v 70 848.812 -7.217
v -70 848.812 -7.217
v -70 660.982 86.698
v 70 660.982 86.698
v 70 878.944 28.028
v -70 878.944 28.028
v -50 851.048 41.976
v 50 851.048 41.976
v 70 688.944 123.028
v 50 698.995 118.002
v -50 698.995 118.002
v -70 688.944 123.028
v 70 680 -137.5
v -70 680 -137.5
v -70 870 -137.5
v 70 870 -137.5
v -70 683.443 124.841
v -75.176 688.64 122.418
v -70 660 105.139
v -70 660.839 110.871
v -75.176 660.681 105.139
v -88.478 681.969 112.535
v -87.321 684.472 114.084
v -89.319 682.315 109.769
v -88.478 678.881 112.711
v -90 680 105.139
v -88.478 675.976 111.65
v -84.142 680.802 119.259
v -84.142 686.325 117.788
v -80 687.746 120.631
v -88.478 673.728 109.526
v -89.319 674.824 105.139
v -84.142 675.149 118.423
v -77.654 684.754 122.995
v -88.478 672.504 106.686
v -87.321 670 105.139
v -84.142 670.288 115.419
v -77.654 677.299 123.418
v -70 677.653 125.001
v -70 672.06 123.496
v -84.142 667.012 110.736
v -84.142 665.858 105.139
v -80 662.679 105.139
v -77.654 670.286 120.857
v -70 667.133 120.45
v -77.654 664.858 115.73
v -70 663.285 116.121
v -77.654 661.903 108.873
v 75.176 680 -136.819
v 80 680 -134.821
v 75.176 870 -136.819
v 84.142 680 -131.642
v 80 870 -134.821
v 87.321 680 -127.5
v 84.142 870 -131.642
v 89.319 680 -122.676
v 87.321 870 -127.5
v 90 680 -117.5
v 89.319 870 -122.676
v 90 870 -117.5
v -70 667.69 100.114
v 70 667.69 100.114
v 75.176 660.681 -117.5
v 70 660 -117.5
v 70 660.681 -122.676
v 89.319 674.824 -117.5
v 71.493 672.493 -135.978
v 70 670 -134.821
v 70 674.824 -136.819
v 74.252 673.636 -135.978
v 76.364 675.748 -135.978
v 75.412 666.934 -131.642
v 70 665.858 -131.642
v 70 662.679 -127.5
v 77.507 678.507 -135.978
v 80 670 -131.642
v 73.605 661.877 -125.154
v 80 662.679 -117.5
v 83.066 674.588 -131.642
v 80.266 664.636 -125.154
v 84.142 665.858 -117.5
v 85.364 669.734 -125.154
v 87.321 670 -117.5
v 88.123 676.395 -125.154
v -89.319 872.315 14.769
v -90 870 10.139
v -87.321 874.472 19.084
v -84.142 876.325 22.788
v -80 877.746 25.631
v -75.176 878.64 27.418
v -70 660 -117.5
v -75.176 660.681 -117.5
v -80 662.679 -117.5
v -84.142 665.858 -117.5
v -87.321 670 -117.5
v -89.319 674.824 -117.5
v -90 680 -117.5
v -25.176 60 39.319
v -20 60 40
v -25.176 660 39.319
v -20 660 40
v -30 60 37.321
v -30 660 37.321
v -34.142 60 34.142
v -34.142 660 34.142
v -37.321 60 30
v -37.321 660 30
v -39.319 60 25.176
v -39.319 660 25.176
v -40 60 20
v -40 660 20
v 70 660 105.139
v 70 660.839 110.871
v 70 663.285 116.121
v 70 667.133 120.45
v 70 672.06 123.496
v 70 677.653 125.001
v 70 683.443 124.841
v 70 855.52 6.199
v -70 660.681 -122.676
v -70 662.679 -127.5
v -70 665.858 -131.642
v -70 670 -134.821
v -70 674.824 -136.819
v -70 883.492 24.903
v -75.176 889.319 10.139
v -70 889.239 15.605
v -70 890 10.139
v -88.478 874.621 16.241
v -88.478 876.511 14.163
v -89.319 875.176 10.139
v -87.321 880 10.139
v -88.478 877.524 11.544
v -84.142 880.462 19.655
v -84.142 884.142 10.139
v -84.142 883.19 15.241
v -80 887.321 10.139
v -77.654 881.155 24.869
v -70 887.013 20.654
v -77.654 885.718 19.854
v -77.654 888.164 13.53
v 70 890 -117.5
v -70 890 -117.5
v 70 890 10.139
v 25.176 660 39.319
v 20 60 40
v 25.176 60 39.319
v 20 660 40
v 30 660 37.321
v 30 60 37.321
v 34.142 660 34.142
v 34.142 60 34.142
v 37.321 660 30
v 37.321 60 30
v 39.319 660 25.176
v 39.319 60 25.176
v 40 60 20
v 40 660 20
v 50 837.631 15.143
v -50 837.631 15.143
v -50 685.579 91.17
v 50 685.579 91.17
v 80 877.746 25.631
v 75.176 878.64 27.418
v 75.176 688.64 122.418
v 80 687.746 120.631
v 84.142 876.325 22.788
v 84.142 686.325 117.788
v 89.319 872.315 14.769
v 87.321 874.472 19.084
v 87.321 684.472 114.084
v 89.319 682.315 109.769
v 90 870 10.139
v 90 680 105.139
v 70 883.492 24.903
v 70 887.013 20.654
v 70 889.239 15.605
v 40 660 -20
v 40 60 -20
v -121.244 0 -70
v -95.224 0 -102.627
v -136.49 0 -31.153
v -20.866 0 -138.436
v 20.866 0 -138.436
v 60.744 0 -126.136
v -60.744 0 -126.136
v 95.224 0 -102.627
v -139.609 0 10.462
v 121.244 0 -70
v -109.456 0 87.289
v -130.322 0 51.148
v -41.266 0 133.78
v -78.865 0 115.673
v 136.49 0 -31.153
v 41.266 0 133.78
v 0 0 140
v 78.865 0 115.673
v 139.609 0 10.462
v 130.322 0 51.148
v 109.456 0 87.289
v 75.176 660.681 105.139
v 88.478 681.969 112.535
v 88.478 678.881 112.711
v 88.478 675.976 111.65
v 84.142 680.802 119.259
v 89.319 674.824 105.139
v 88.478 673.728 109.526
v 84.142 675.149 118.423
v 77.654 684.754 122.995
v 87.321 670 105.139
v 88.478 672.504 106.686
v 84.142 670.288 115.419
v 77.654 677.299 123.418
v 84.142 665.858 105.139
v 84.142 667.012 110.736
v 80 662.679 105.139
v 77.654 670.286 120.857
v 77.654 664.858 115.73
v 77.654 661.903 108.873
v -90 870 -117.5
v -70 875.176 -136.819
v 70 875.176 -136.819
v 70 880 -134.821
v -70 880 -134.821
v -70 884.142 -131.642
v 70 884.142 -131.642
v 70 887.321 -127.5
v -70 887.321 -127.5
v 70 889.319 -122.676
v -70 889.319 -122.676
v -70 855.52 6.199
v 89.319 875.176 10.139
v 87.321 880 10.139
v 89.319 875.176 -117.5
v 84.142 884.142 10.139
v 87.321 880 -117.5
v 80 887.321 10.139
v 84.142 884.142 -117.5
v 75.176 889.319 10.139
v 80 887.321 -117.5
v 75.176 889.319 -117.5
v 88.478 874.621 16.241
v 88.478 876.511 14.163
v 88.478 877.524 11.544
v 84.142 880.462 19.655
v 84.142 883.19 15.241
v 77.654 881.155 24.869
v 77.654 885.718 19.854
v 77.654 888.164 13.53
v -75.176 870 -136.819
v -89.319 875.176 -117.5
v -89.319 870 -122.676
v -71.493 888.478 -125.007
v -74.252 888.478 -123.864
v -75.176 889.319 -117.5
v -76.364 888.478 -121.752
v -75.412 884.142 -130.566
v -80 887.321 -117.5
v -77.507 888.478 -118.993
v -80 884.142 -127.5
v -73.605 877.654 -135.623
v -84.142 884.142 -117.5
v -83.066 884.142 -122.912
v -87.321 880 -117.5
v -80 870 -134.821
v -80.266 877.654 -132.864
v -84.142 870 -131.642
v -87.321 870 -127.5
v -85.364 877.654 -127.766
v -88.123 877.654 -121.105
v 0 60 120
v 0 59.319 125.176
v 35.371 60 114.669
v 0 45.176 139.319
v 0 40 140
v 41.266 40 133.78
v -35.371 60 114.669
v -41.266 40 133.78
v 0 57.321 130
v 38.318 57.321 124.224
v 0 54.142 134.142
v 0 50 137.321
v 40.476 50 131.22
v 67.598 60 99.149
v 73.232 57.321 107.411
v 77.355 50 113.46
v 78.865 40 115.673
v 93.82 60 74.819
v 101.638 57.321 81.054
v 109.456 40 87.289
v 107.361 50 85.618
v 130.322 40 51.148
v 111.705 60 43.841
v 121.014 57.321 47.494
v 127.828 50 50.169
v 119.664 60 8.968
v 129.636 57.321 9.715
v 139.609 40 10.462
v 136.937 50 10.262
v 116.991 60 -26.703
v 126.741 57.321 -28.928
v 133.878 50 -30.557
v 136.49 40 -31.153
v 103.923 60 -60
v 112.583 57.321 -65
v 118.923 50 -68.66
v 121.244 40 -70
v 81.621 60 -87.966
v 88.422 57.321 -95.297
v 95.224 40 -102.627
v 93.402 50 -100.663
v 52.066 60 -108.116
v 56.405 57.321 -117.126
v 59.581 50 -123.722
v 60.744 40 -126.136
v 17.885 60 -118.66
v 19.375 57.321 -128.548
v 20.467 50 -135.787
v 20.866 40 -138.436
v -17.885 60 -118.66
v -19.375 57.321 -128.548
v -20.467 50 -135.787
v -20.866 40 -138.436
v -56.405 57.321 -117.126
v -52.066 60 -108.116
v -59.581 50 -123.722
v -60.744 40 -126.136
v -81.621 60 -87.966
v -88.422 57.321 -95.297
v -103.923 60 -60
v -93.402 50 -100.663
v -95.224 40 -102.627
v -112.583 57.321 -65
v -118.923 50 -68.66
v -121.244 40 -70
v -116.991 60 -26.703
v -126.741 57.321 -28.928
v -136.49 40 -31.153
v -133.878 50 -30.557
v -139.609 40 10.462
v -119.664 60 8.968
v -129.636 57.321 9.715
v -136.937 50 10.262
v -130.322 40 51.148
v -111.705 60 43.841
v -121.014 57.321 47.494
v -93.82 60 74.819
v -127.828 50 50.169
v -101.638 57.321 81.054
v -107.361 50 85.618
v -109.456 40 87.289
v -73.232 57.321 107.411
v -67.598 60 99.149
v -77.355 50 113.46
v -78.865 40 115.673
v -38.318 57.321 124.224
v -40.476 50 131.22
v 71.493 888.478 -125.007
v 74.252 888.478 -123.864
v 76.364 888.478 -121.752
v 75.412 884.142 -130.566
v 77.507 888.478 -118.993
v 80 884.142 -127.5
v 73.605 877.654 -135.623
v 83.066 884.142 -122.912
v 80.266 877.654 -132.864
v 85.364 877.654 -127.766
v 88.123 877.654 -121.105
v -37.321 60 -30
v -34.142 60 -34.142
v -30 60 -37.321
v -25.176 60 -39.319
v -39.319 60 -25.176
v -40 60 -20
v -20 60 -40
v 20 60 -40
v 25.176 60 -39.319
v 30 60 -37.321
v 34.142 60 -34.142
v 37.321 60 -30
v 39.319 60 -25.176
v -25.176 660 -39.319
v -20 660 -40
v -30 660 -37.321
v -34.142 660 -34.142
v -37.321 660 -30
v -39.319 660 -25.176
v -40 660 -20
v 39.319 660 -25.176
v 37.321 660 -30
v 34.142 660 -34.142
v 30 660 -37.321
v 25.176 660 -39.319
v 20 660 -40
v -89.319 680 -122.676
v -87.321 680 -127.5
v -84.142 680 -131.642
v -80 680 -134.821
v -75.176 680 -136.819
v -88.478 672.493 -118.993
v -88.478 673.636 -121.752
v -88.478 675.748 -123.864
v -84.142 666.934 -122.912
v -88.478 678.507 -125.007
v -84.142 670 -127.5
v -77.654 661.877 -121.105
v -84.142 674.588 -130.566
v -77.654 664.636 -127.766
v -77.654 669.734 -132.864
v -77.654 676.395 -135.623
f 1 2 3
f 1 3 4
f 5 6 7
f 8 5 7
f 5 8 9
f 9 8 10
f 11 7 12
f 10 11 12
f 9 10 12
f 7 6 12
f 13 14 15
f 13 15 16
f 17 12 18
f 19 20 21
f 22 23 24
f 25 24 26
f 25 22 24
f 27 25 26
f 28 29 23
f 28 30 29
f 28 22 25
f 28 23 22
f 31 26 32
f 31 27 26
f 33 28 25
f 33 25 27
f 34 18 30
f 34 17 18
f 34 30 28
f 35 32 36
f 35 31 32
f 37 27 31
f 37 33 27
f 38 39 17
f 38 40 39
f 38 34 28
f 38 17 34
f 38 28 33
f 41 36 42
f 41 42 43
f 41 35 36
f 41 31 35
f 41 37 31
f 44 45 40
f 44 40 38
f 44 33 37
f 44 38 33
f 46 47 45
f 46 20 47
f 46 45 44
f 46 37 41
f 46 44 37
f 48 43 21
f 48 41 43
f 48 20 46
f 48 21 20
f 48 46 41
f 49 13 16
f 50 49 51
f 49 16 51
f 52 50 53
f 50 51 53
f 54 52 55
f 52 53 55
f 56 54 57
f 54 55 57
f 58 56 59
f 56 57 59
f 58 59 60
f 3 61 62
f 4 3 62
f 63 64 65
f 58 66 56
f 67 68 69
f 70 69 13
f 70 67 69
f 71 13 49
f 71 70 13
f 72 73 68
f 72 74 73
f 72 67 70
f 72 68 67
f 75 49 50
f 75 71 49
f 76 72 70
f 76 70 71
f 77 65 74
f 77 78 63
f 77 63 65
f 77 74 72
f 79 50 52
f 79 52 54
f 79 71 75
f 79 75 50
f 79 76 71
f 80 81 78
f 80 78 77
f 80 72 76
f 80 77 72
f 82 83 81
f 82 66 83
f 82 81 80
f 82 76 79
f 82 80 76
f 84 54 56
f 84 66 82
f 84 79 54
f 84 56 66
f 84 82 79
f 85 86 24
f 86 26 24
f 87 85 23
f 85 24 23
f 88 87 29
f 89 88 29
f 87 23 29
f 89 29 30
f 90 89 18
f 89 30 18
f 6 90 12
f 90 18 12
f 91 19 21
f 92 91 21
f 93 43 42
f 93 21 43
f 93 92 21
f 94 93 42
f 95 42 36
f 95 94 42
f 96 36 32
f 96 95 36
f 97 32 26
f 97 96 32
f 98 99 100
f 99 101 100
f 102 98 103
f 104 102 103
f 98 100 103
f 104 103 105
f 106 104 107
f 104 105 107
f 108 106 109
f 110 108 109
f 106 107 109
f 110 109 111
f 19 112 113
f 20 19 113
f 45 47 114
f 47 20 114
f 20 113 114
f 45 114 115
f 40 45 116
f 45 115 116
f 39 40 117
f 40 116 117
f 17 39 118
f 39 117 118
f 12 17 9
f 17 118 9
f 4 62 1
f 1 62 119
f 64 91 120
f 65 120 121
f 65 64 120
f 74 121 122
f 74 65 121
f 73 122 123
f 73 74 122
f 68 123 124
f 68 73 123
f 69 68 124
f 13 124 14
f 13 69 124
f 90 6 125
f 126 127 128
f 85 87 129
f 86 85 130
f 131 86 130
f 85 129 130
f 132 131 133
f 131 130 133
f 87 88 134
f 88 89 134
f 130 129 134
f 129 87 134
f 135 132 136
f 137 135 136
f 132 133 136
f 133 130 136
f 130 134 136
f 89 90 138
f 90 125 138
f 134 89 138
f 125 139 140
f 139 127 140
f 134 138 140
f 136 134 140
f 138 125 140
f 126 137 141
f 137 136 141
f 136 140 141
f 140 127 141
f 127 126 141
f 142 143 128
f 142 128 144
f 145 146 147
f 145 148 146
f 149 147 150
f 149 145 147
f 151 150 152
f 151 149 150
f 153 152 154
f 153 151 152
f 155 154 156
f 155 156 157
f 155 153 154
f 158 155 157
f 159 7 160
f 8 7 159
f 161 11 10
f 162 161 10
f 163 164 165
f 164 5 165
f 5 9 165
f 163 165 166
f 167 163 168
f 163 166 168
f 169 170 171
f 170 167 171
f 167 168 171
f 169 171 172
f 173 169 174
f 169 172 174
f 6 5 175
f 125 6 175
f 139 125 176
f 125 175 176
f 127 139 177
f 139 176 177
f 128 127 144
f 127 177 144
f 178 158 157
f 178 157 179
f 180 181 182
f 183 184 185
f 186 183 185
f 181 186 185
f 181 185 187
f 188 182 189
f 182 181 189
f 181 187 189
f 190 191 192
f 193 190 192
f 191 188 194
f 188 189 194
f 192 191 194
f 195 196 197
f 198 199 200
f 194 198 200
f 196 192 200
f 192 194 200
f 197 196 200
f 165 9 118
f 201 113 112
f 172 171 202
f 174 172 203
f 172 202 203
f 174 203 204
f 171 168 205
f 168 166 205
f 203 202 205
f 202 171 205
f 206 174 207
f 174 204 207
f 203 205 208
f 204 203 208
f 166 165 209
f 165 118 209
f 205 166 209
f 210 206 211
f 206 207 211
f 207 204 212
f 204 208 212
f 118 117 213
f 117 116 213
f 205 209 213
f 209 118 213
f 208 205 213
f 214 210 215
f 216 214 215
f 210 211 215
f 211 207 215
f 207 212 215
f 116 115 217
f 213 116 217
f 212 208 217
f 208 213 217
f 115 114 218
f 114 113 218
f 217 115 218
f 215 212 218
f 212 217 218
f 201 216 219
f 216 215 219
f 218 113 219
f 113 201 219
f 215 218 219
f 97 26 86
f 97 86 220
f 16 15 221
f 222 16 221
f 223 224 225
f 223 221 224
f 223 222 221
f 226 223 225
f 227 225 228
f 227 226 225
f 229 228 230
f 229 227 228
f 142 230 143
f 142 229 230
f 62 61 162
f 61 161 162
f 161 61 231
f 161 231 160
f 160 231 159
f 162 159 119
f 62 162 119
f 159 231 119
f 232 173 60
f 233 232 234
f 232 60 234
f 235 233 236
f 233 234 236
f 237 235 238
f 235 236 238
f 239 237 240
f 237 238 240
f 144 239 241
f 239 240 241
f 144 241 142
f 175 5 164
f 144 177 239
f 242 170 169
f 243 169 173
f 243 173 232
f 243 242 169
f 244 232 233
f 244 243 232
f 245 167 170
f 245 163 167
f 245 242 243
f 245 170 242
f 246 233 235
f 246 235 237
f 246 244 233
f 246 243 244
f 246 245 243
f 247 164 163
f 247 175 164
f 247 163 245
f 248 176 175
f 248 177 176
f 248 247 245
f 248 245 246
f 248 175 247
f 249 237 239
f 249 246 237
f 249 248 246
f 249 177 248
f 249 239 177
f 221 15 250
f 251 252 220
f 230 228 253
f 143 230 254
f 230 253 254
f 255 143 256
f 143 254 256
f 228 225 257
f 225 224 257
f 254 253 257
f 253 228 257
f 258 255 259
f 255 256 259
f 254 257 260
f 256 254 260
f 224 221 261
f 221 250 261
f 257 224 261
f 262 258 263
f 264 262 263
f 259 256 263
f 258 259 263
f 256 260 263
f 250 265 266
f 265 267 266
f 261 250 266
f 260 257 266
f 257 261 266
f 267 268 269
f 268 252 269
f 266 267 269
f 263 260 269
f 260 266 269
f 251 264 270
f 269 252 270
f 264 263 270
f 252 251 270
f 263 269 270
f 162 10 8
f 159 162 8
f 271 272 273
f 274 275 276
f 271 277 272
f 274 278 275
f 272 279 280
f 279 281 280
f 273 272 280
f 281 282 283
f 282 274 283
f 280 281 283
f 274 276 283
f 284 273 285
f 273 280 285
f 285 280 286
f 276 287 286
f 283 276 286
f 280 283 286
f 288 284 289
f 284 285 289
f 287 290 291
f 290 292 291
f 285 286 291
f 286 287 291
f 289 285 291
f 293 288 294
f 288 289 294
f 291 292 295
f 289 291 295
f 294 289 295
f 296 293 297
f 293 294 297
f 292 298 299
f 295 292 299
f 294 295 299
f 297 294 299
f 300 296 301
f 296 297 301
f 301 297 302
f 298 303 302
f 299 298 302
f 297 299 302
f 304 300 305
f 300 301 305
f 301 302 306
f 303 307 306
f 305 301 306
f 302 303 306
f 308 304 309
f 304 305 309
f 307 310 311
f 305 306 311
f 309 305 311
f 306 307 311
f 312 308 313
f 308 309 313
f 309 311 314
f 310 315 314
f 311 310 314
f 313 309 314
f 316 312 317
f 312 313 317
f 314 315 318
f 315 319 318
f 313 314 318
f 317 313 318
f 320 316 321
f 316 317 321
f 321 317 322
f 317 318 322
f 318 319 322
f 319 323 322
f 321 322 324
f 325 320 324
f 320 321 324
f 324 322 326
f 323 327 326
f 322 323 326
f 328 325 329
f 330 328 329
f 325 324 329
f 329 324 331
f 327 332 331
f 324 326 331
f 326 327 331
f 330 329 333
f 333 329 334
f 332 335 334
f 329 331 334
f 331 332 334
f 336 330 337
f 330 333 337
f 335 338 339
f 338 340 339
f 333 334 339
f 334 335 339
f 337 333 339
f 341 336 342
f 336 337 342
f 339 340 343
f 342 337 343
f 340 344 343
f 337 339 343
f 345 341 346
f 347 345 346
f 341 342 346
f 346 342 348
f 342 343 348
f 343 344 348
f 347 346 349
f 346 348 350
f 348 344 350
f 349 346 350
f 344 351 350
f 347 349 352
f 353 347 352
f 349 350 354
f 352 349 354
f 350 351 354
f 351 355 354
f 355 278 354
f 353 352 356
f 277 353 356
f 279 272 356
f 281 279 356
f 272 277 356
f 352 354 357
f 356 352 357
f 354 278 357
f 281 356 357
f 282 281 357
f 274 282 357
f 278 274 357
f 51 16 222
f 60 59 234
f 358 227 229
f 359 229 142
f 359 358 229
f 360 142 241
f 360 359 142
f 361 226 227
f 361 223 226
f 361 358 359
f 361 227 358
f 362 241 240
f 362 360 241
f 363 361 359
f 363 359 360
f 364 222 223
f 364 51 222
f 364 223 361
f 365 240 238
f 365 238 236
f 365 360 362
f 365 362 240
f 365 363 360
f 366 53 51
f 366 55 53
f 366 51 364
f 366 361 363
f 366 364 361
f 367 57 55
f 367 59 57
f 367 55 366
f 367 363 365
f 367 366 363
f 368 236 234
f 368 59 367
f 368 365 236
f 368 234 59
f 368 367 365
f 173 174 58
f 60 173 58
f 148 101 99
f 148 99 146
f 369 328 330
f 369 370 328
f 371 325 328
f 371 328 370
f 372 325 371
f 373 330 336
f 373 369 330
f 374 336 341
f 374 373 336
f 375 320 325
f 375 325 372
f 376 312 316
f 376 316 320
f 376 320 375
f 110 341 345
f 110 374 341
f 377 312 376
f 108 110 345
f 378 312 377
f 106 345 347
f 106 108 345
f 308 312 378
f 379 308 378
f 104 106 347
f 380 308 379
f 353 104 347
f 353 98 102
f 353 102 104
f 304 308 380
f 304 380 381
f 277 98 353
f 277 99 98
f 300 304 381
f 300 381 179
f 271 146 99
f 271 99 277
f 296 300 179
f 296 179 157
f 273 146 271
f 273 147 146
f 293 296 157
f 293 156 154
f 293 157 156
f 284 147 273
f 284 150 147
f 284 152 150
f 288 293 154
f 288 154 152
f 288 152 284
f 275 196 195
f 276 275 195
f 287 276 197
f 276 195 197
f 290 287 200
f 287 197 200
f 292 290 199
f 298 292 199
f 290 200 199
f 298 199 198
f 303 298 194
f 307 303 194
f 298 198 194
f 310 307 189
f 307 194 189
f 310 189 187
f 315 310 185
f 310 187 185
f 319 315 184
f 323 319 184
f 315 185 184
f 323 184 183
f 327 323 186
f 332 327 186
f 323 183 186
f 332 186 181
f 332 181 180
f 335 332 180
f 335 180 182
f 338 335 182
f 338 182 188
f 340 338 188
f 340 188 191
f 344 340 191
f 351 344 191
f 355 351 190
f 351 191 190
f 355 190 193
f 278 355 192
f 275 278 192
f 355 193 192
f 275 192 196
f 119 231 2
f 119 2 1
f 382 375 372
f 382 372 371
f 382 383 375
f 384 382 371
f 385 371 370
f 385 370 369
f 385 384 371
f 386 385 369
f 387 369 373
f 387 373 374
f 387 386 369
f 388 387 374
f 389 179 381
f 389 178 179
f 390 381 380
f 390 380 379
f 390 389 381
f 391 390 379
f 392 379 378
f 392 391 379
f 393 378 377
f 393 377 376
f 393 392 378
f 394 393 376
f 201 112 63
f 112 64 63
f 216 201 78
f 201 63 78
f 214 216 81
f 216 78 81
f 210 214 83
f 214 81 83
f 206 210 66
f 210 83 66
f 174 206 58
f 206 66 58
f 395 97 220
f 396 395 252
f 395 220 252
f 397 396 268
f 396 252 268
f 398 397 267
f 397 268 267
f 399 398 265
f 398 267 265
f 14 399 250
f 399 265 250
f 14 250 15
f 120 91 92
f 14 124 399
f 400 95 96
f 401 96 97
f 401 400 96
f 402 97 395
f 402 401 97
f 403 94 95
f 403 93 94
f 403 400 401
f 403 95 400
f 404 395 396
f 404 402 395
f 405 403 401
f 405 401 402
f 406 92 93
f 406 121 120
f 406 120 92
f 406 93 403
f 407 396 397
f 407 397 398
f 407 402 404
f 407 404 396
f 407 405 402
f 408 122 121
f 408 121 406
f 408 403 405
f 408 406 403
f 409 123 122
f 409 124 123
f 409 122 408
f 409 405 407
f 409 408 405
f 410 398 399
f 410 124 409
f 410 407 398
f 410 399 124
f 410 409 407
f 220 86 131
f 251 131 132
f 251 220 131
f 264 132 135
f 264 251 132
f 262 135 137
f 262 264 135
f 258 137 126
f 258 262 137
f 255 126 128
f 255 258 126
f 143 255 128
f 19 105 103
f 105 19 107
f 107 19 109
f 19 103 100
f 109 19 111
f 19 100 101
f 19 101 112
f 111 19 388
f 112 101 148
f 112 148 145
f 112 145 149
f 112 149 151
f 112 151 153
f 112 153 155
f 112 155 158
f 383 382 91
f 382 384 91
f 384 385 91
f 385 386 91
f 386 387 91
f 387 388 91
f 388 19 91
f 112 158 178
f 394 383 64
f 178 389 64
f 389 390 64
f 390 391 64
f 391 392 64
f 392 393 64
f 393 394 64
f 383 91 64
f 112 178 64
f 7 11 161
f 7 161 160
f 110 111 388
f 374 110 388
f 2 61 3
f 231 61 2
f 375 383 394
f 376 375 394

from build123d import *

# Parameters (mm, degrees)
SKETCH1_R           = 140
BOSS_EXTRUDE1_DEPTH = 60
SKETCH2_W           = 80
SKETCH2_H           = 80
BOSS_EXTRUDE2_DEPTH = 600
SKETCH3_W           = 180
SKETCH3_H           = 275
BOSS_EXTRUDE3_DEPTH = 230
CUT_EXTRUDE1_DEPTH  = 930.838695689
SKETCH5_W           = 100
SKETCH5_H           = 170
CUT_EXTRUDE2_DEPTH  = 30
SKETCH6_W           = 140
SKETCH6_H           = 210
CUT_EXTRUDE3_DEPTH  = 15
FILLET1_R           = 20
FILLET2_R           = 20
FILLET3_R           = 20


with BuildPart() as part:
    # Sketch1 → Boss-Extrude1 (new body)
    with BuildSketch(Plane(origin=(0, 0, 0), x_dir=(1, 0, 0), z_dir=(0, 1, 0))):
        with Locations(Location((0, 0, 0), (0, 0, 270))):
            Circle(SKETCH1_R)
    extrude(amount=BOSS_EXTRUDE1_DEPTH)

    # Sketch2 → Boss-Extrude2 (add)
    with BuildSketch(Plane(origin=(0, 60, 0), x_dir=(1, 0, 0), z_dir=(0, 1, 0))):
        Rectangle(SKETCH2_W, SKETCH2_H)
    extrude(amount=BOSS_EXTRUDE2_DEPTH)

    # Sketch3 → Boss-Extrude3 (add)
    with BuildSketch(Plane(origin=(0, 660, 0), x_dir=(1, 0, 0), z_dir=(0, 1, 0))):
        Rectangle(SKETCH3_W, SKETCH3_H)
    extrude(amount=BOSS_EXTRUDE3_DEPTH)

    # Sketch4 → Cut-Extrude1 (cut, through all)
    with BuildSketch(Plane.ZY.offset(90)):
        Polygon((22.5, 890), (137.5, 660), (137.5, 890), align=None)
    extrude(amount=-CUT_EXTRUDE1_DEPTH, mode=Mode.SUBTRACT)

    # Sketch5 → Cut-Extrude2 (cut)
    with BuildSketch(Plane(origin=(0, 187, 374), x_dir=(1, 0, 0), z_dir=(0, 0.4472135954999582, 0.8944271909999159))):
        with Locations((0, 657.427894091)):
            Rectangle(SKETCH5_W, SKETCH5_H)
    extrude(amount=-CUT_EXTRUDE2_DEPTH, mode=Mode.SUBTRACT)

    # Sketch6 → Cut-Extrude3 (cut)
    with BuildSketch(Plane(origin=(0, 173.583592135, 347.16718427), x_dir=(1, 0, 0), z_dir=(0, 0.44721359549995826, 0.8944271909999159))):
        with Locations((0, 657.427894091)):
            Rectangle(SKETCH6_W, SKETCH6_H)
    extrude(amount=-CUT_EXTRUDE3_DEPTH, mode=Mode.SUBTRACT)

    # Fillet1
    fillet1_edges = [part.edges().sort_by_distance(p)[0] for p in [
        (0, 60, -140),
        (40, 360, 40),
        (40, 360, -40),
        (-40, 360, -40),
    ]]
    fillet(fillet1_edges, radius=FILLET1_R)

    # Fillet2
    fillet2_edges = [part.edges().sort_by_distance(p)[0] for p in [
        (-40, 360, 40),
    ]]
    fillet(fillet2_edges, radius=FILLET2_R)

    # Fillet3
    fillet3_edges = [part.edges().sort_by_distance(p)[0] for p in [
        (90, 660, 0),
        (0, 660, -137.5),
        (90, 775, -137.5),
        (-90, 660, 0),
        (-90, 775, -137.5),
        (0, 660, 137.5),
        (0, 890, -137.5),
        (-90, 890, -57.5),
        (90, 890, -57.5),
        (0, 890, 22.5),
        (90, 775, 80),
        (-90, 775, 80),
    ]]
    fillet(fillet3_edges, radius=FILLET3_R)


solid = part.part
